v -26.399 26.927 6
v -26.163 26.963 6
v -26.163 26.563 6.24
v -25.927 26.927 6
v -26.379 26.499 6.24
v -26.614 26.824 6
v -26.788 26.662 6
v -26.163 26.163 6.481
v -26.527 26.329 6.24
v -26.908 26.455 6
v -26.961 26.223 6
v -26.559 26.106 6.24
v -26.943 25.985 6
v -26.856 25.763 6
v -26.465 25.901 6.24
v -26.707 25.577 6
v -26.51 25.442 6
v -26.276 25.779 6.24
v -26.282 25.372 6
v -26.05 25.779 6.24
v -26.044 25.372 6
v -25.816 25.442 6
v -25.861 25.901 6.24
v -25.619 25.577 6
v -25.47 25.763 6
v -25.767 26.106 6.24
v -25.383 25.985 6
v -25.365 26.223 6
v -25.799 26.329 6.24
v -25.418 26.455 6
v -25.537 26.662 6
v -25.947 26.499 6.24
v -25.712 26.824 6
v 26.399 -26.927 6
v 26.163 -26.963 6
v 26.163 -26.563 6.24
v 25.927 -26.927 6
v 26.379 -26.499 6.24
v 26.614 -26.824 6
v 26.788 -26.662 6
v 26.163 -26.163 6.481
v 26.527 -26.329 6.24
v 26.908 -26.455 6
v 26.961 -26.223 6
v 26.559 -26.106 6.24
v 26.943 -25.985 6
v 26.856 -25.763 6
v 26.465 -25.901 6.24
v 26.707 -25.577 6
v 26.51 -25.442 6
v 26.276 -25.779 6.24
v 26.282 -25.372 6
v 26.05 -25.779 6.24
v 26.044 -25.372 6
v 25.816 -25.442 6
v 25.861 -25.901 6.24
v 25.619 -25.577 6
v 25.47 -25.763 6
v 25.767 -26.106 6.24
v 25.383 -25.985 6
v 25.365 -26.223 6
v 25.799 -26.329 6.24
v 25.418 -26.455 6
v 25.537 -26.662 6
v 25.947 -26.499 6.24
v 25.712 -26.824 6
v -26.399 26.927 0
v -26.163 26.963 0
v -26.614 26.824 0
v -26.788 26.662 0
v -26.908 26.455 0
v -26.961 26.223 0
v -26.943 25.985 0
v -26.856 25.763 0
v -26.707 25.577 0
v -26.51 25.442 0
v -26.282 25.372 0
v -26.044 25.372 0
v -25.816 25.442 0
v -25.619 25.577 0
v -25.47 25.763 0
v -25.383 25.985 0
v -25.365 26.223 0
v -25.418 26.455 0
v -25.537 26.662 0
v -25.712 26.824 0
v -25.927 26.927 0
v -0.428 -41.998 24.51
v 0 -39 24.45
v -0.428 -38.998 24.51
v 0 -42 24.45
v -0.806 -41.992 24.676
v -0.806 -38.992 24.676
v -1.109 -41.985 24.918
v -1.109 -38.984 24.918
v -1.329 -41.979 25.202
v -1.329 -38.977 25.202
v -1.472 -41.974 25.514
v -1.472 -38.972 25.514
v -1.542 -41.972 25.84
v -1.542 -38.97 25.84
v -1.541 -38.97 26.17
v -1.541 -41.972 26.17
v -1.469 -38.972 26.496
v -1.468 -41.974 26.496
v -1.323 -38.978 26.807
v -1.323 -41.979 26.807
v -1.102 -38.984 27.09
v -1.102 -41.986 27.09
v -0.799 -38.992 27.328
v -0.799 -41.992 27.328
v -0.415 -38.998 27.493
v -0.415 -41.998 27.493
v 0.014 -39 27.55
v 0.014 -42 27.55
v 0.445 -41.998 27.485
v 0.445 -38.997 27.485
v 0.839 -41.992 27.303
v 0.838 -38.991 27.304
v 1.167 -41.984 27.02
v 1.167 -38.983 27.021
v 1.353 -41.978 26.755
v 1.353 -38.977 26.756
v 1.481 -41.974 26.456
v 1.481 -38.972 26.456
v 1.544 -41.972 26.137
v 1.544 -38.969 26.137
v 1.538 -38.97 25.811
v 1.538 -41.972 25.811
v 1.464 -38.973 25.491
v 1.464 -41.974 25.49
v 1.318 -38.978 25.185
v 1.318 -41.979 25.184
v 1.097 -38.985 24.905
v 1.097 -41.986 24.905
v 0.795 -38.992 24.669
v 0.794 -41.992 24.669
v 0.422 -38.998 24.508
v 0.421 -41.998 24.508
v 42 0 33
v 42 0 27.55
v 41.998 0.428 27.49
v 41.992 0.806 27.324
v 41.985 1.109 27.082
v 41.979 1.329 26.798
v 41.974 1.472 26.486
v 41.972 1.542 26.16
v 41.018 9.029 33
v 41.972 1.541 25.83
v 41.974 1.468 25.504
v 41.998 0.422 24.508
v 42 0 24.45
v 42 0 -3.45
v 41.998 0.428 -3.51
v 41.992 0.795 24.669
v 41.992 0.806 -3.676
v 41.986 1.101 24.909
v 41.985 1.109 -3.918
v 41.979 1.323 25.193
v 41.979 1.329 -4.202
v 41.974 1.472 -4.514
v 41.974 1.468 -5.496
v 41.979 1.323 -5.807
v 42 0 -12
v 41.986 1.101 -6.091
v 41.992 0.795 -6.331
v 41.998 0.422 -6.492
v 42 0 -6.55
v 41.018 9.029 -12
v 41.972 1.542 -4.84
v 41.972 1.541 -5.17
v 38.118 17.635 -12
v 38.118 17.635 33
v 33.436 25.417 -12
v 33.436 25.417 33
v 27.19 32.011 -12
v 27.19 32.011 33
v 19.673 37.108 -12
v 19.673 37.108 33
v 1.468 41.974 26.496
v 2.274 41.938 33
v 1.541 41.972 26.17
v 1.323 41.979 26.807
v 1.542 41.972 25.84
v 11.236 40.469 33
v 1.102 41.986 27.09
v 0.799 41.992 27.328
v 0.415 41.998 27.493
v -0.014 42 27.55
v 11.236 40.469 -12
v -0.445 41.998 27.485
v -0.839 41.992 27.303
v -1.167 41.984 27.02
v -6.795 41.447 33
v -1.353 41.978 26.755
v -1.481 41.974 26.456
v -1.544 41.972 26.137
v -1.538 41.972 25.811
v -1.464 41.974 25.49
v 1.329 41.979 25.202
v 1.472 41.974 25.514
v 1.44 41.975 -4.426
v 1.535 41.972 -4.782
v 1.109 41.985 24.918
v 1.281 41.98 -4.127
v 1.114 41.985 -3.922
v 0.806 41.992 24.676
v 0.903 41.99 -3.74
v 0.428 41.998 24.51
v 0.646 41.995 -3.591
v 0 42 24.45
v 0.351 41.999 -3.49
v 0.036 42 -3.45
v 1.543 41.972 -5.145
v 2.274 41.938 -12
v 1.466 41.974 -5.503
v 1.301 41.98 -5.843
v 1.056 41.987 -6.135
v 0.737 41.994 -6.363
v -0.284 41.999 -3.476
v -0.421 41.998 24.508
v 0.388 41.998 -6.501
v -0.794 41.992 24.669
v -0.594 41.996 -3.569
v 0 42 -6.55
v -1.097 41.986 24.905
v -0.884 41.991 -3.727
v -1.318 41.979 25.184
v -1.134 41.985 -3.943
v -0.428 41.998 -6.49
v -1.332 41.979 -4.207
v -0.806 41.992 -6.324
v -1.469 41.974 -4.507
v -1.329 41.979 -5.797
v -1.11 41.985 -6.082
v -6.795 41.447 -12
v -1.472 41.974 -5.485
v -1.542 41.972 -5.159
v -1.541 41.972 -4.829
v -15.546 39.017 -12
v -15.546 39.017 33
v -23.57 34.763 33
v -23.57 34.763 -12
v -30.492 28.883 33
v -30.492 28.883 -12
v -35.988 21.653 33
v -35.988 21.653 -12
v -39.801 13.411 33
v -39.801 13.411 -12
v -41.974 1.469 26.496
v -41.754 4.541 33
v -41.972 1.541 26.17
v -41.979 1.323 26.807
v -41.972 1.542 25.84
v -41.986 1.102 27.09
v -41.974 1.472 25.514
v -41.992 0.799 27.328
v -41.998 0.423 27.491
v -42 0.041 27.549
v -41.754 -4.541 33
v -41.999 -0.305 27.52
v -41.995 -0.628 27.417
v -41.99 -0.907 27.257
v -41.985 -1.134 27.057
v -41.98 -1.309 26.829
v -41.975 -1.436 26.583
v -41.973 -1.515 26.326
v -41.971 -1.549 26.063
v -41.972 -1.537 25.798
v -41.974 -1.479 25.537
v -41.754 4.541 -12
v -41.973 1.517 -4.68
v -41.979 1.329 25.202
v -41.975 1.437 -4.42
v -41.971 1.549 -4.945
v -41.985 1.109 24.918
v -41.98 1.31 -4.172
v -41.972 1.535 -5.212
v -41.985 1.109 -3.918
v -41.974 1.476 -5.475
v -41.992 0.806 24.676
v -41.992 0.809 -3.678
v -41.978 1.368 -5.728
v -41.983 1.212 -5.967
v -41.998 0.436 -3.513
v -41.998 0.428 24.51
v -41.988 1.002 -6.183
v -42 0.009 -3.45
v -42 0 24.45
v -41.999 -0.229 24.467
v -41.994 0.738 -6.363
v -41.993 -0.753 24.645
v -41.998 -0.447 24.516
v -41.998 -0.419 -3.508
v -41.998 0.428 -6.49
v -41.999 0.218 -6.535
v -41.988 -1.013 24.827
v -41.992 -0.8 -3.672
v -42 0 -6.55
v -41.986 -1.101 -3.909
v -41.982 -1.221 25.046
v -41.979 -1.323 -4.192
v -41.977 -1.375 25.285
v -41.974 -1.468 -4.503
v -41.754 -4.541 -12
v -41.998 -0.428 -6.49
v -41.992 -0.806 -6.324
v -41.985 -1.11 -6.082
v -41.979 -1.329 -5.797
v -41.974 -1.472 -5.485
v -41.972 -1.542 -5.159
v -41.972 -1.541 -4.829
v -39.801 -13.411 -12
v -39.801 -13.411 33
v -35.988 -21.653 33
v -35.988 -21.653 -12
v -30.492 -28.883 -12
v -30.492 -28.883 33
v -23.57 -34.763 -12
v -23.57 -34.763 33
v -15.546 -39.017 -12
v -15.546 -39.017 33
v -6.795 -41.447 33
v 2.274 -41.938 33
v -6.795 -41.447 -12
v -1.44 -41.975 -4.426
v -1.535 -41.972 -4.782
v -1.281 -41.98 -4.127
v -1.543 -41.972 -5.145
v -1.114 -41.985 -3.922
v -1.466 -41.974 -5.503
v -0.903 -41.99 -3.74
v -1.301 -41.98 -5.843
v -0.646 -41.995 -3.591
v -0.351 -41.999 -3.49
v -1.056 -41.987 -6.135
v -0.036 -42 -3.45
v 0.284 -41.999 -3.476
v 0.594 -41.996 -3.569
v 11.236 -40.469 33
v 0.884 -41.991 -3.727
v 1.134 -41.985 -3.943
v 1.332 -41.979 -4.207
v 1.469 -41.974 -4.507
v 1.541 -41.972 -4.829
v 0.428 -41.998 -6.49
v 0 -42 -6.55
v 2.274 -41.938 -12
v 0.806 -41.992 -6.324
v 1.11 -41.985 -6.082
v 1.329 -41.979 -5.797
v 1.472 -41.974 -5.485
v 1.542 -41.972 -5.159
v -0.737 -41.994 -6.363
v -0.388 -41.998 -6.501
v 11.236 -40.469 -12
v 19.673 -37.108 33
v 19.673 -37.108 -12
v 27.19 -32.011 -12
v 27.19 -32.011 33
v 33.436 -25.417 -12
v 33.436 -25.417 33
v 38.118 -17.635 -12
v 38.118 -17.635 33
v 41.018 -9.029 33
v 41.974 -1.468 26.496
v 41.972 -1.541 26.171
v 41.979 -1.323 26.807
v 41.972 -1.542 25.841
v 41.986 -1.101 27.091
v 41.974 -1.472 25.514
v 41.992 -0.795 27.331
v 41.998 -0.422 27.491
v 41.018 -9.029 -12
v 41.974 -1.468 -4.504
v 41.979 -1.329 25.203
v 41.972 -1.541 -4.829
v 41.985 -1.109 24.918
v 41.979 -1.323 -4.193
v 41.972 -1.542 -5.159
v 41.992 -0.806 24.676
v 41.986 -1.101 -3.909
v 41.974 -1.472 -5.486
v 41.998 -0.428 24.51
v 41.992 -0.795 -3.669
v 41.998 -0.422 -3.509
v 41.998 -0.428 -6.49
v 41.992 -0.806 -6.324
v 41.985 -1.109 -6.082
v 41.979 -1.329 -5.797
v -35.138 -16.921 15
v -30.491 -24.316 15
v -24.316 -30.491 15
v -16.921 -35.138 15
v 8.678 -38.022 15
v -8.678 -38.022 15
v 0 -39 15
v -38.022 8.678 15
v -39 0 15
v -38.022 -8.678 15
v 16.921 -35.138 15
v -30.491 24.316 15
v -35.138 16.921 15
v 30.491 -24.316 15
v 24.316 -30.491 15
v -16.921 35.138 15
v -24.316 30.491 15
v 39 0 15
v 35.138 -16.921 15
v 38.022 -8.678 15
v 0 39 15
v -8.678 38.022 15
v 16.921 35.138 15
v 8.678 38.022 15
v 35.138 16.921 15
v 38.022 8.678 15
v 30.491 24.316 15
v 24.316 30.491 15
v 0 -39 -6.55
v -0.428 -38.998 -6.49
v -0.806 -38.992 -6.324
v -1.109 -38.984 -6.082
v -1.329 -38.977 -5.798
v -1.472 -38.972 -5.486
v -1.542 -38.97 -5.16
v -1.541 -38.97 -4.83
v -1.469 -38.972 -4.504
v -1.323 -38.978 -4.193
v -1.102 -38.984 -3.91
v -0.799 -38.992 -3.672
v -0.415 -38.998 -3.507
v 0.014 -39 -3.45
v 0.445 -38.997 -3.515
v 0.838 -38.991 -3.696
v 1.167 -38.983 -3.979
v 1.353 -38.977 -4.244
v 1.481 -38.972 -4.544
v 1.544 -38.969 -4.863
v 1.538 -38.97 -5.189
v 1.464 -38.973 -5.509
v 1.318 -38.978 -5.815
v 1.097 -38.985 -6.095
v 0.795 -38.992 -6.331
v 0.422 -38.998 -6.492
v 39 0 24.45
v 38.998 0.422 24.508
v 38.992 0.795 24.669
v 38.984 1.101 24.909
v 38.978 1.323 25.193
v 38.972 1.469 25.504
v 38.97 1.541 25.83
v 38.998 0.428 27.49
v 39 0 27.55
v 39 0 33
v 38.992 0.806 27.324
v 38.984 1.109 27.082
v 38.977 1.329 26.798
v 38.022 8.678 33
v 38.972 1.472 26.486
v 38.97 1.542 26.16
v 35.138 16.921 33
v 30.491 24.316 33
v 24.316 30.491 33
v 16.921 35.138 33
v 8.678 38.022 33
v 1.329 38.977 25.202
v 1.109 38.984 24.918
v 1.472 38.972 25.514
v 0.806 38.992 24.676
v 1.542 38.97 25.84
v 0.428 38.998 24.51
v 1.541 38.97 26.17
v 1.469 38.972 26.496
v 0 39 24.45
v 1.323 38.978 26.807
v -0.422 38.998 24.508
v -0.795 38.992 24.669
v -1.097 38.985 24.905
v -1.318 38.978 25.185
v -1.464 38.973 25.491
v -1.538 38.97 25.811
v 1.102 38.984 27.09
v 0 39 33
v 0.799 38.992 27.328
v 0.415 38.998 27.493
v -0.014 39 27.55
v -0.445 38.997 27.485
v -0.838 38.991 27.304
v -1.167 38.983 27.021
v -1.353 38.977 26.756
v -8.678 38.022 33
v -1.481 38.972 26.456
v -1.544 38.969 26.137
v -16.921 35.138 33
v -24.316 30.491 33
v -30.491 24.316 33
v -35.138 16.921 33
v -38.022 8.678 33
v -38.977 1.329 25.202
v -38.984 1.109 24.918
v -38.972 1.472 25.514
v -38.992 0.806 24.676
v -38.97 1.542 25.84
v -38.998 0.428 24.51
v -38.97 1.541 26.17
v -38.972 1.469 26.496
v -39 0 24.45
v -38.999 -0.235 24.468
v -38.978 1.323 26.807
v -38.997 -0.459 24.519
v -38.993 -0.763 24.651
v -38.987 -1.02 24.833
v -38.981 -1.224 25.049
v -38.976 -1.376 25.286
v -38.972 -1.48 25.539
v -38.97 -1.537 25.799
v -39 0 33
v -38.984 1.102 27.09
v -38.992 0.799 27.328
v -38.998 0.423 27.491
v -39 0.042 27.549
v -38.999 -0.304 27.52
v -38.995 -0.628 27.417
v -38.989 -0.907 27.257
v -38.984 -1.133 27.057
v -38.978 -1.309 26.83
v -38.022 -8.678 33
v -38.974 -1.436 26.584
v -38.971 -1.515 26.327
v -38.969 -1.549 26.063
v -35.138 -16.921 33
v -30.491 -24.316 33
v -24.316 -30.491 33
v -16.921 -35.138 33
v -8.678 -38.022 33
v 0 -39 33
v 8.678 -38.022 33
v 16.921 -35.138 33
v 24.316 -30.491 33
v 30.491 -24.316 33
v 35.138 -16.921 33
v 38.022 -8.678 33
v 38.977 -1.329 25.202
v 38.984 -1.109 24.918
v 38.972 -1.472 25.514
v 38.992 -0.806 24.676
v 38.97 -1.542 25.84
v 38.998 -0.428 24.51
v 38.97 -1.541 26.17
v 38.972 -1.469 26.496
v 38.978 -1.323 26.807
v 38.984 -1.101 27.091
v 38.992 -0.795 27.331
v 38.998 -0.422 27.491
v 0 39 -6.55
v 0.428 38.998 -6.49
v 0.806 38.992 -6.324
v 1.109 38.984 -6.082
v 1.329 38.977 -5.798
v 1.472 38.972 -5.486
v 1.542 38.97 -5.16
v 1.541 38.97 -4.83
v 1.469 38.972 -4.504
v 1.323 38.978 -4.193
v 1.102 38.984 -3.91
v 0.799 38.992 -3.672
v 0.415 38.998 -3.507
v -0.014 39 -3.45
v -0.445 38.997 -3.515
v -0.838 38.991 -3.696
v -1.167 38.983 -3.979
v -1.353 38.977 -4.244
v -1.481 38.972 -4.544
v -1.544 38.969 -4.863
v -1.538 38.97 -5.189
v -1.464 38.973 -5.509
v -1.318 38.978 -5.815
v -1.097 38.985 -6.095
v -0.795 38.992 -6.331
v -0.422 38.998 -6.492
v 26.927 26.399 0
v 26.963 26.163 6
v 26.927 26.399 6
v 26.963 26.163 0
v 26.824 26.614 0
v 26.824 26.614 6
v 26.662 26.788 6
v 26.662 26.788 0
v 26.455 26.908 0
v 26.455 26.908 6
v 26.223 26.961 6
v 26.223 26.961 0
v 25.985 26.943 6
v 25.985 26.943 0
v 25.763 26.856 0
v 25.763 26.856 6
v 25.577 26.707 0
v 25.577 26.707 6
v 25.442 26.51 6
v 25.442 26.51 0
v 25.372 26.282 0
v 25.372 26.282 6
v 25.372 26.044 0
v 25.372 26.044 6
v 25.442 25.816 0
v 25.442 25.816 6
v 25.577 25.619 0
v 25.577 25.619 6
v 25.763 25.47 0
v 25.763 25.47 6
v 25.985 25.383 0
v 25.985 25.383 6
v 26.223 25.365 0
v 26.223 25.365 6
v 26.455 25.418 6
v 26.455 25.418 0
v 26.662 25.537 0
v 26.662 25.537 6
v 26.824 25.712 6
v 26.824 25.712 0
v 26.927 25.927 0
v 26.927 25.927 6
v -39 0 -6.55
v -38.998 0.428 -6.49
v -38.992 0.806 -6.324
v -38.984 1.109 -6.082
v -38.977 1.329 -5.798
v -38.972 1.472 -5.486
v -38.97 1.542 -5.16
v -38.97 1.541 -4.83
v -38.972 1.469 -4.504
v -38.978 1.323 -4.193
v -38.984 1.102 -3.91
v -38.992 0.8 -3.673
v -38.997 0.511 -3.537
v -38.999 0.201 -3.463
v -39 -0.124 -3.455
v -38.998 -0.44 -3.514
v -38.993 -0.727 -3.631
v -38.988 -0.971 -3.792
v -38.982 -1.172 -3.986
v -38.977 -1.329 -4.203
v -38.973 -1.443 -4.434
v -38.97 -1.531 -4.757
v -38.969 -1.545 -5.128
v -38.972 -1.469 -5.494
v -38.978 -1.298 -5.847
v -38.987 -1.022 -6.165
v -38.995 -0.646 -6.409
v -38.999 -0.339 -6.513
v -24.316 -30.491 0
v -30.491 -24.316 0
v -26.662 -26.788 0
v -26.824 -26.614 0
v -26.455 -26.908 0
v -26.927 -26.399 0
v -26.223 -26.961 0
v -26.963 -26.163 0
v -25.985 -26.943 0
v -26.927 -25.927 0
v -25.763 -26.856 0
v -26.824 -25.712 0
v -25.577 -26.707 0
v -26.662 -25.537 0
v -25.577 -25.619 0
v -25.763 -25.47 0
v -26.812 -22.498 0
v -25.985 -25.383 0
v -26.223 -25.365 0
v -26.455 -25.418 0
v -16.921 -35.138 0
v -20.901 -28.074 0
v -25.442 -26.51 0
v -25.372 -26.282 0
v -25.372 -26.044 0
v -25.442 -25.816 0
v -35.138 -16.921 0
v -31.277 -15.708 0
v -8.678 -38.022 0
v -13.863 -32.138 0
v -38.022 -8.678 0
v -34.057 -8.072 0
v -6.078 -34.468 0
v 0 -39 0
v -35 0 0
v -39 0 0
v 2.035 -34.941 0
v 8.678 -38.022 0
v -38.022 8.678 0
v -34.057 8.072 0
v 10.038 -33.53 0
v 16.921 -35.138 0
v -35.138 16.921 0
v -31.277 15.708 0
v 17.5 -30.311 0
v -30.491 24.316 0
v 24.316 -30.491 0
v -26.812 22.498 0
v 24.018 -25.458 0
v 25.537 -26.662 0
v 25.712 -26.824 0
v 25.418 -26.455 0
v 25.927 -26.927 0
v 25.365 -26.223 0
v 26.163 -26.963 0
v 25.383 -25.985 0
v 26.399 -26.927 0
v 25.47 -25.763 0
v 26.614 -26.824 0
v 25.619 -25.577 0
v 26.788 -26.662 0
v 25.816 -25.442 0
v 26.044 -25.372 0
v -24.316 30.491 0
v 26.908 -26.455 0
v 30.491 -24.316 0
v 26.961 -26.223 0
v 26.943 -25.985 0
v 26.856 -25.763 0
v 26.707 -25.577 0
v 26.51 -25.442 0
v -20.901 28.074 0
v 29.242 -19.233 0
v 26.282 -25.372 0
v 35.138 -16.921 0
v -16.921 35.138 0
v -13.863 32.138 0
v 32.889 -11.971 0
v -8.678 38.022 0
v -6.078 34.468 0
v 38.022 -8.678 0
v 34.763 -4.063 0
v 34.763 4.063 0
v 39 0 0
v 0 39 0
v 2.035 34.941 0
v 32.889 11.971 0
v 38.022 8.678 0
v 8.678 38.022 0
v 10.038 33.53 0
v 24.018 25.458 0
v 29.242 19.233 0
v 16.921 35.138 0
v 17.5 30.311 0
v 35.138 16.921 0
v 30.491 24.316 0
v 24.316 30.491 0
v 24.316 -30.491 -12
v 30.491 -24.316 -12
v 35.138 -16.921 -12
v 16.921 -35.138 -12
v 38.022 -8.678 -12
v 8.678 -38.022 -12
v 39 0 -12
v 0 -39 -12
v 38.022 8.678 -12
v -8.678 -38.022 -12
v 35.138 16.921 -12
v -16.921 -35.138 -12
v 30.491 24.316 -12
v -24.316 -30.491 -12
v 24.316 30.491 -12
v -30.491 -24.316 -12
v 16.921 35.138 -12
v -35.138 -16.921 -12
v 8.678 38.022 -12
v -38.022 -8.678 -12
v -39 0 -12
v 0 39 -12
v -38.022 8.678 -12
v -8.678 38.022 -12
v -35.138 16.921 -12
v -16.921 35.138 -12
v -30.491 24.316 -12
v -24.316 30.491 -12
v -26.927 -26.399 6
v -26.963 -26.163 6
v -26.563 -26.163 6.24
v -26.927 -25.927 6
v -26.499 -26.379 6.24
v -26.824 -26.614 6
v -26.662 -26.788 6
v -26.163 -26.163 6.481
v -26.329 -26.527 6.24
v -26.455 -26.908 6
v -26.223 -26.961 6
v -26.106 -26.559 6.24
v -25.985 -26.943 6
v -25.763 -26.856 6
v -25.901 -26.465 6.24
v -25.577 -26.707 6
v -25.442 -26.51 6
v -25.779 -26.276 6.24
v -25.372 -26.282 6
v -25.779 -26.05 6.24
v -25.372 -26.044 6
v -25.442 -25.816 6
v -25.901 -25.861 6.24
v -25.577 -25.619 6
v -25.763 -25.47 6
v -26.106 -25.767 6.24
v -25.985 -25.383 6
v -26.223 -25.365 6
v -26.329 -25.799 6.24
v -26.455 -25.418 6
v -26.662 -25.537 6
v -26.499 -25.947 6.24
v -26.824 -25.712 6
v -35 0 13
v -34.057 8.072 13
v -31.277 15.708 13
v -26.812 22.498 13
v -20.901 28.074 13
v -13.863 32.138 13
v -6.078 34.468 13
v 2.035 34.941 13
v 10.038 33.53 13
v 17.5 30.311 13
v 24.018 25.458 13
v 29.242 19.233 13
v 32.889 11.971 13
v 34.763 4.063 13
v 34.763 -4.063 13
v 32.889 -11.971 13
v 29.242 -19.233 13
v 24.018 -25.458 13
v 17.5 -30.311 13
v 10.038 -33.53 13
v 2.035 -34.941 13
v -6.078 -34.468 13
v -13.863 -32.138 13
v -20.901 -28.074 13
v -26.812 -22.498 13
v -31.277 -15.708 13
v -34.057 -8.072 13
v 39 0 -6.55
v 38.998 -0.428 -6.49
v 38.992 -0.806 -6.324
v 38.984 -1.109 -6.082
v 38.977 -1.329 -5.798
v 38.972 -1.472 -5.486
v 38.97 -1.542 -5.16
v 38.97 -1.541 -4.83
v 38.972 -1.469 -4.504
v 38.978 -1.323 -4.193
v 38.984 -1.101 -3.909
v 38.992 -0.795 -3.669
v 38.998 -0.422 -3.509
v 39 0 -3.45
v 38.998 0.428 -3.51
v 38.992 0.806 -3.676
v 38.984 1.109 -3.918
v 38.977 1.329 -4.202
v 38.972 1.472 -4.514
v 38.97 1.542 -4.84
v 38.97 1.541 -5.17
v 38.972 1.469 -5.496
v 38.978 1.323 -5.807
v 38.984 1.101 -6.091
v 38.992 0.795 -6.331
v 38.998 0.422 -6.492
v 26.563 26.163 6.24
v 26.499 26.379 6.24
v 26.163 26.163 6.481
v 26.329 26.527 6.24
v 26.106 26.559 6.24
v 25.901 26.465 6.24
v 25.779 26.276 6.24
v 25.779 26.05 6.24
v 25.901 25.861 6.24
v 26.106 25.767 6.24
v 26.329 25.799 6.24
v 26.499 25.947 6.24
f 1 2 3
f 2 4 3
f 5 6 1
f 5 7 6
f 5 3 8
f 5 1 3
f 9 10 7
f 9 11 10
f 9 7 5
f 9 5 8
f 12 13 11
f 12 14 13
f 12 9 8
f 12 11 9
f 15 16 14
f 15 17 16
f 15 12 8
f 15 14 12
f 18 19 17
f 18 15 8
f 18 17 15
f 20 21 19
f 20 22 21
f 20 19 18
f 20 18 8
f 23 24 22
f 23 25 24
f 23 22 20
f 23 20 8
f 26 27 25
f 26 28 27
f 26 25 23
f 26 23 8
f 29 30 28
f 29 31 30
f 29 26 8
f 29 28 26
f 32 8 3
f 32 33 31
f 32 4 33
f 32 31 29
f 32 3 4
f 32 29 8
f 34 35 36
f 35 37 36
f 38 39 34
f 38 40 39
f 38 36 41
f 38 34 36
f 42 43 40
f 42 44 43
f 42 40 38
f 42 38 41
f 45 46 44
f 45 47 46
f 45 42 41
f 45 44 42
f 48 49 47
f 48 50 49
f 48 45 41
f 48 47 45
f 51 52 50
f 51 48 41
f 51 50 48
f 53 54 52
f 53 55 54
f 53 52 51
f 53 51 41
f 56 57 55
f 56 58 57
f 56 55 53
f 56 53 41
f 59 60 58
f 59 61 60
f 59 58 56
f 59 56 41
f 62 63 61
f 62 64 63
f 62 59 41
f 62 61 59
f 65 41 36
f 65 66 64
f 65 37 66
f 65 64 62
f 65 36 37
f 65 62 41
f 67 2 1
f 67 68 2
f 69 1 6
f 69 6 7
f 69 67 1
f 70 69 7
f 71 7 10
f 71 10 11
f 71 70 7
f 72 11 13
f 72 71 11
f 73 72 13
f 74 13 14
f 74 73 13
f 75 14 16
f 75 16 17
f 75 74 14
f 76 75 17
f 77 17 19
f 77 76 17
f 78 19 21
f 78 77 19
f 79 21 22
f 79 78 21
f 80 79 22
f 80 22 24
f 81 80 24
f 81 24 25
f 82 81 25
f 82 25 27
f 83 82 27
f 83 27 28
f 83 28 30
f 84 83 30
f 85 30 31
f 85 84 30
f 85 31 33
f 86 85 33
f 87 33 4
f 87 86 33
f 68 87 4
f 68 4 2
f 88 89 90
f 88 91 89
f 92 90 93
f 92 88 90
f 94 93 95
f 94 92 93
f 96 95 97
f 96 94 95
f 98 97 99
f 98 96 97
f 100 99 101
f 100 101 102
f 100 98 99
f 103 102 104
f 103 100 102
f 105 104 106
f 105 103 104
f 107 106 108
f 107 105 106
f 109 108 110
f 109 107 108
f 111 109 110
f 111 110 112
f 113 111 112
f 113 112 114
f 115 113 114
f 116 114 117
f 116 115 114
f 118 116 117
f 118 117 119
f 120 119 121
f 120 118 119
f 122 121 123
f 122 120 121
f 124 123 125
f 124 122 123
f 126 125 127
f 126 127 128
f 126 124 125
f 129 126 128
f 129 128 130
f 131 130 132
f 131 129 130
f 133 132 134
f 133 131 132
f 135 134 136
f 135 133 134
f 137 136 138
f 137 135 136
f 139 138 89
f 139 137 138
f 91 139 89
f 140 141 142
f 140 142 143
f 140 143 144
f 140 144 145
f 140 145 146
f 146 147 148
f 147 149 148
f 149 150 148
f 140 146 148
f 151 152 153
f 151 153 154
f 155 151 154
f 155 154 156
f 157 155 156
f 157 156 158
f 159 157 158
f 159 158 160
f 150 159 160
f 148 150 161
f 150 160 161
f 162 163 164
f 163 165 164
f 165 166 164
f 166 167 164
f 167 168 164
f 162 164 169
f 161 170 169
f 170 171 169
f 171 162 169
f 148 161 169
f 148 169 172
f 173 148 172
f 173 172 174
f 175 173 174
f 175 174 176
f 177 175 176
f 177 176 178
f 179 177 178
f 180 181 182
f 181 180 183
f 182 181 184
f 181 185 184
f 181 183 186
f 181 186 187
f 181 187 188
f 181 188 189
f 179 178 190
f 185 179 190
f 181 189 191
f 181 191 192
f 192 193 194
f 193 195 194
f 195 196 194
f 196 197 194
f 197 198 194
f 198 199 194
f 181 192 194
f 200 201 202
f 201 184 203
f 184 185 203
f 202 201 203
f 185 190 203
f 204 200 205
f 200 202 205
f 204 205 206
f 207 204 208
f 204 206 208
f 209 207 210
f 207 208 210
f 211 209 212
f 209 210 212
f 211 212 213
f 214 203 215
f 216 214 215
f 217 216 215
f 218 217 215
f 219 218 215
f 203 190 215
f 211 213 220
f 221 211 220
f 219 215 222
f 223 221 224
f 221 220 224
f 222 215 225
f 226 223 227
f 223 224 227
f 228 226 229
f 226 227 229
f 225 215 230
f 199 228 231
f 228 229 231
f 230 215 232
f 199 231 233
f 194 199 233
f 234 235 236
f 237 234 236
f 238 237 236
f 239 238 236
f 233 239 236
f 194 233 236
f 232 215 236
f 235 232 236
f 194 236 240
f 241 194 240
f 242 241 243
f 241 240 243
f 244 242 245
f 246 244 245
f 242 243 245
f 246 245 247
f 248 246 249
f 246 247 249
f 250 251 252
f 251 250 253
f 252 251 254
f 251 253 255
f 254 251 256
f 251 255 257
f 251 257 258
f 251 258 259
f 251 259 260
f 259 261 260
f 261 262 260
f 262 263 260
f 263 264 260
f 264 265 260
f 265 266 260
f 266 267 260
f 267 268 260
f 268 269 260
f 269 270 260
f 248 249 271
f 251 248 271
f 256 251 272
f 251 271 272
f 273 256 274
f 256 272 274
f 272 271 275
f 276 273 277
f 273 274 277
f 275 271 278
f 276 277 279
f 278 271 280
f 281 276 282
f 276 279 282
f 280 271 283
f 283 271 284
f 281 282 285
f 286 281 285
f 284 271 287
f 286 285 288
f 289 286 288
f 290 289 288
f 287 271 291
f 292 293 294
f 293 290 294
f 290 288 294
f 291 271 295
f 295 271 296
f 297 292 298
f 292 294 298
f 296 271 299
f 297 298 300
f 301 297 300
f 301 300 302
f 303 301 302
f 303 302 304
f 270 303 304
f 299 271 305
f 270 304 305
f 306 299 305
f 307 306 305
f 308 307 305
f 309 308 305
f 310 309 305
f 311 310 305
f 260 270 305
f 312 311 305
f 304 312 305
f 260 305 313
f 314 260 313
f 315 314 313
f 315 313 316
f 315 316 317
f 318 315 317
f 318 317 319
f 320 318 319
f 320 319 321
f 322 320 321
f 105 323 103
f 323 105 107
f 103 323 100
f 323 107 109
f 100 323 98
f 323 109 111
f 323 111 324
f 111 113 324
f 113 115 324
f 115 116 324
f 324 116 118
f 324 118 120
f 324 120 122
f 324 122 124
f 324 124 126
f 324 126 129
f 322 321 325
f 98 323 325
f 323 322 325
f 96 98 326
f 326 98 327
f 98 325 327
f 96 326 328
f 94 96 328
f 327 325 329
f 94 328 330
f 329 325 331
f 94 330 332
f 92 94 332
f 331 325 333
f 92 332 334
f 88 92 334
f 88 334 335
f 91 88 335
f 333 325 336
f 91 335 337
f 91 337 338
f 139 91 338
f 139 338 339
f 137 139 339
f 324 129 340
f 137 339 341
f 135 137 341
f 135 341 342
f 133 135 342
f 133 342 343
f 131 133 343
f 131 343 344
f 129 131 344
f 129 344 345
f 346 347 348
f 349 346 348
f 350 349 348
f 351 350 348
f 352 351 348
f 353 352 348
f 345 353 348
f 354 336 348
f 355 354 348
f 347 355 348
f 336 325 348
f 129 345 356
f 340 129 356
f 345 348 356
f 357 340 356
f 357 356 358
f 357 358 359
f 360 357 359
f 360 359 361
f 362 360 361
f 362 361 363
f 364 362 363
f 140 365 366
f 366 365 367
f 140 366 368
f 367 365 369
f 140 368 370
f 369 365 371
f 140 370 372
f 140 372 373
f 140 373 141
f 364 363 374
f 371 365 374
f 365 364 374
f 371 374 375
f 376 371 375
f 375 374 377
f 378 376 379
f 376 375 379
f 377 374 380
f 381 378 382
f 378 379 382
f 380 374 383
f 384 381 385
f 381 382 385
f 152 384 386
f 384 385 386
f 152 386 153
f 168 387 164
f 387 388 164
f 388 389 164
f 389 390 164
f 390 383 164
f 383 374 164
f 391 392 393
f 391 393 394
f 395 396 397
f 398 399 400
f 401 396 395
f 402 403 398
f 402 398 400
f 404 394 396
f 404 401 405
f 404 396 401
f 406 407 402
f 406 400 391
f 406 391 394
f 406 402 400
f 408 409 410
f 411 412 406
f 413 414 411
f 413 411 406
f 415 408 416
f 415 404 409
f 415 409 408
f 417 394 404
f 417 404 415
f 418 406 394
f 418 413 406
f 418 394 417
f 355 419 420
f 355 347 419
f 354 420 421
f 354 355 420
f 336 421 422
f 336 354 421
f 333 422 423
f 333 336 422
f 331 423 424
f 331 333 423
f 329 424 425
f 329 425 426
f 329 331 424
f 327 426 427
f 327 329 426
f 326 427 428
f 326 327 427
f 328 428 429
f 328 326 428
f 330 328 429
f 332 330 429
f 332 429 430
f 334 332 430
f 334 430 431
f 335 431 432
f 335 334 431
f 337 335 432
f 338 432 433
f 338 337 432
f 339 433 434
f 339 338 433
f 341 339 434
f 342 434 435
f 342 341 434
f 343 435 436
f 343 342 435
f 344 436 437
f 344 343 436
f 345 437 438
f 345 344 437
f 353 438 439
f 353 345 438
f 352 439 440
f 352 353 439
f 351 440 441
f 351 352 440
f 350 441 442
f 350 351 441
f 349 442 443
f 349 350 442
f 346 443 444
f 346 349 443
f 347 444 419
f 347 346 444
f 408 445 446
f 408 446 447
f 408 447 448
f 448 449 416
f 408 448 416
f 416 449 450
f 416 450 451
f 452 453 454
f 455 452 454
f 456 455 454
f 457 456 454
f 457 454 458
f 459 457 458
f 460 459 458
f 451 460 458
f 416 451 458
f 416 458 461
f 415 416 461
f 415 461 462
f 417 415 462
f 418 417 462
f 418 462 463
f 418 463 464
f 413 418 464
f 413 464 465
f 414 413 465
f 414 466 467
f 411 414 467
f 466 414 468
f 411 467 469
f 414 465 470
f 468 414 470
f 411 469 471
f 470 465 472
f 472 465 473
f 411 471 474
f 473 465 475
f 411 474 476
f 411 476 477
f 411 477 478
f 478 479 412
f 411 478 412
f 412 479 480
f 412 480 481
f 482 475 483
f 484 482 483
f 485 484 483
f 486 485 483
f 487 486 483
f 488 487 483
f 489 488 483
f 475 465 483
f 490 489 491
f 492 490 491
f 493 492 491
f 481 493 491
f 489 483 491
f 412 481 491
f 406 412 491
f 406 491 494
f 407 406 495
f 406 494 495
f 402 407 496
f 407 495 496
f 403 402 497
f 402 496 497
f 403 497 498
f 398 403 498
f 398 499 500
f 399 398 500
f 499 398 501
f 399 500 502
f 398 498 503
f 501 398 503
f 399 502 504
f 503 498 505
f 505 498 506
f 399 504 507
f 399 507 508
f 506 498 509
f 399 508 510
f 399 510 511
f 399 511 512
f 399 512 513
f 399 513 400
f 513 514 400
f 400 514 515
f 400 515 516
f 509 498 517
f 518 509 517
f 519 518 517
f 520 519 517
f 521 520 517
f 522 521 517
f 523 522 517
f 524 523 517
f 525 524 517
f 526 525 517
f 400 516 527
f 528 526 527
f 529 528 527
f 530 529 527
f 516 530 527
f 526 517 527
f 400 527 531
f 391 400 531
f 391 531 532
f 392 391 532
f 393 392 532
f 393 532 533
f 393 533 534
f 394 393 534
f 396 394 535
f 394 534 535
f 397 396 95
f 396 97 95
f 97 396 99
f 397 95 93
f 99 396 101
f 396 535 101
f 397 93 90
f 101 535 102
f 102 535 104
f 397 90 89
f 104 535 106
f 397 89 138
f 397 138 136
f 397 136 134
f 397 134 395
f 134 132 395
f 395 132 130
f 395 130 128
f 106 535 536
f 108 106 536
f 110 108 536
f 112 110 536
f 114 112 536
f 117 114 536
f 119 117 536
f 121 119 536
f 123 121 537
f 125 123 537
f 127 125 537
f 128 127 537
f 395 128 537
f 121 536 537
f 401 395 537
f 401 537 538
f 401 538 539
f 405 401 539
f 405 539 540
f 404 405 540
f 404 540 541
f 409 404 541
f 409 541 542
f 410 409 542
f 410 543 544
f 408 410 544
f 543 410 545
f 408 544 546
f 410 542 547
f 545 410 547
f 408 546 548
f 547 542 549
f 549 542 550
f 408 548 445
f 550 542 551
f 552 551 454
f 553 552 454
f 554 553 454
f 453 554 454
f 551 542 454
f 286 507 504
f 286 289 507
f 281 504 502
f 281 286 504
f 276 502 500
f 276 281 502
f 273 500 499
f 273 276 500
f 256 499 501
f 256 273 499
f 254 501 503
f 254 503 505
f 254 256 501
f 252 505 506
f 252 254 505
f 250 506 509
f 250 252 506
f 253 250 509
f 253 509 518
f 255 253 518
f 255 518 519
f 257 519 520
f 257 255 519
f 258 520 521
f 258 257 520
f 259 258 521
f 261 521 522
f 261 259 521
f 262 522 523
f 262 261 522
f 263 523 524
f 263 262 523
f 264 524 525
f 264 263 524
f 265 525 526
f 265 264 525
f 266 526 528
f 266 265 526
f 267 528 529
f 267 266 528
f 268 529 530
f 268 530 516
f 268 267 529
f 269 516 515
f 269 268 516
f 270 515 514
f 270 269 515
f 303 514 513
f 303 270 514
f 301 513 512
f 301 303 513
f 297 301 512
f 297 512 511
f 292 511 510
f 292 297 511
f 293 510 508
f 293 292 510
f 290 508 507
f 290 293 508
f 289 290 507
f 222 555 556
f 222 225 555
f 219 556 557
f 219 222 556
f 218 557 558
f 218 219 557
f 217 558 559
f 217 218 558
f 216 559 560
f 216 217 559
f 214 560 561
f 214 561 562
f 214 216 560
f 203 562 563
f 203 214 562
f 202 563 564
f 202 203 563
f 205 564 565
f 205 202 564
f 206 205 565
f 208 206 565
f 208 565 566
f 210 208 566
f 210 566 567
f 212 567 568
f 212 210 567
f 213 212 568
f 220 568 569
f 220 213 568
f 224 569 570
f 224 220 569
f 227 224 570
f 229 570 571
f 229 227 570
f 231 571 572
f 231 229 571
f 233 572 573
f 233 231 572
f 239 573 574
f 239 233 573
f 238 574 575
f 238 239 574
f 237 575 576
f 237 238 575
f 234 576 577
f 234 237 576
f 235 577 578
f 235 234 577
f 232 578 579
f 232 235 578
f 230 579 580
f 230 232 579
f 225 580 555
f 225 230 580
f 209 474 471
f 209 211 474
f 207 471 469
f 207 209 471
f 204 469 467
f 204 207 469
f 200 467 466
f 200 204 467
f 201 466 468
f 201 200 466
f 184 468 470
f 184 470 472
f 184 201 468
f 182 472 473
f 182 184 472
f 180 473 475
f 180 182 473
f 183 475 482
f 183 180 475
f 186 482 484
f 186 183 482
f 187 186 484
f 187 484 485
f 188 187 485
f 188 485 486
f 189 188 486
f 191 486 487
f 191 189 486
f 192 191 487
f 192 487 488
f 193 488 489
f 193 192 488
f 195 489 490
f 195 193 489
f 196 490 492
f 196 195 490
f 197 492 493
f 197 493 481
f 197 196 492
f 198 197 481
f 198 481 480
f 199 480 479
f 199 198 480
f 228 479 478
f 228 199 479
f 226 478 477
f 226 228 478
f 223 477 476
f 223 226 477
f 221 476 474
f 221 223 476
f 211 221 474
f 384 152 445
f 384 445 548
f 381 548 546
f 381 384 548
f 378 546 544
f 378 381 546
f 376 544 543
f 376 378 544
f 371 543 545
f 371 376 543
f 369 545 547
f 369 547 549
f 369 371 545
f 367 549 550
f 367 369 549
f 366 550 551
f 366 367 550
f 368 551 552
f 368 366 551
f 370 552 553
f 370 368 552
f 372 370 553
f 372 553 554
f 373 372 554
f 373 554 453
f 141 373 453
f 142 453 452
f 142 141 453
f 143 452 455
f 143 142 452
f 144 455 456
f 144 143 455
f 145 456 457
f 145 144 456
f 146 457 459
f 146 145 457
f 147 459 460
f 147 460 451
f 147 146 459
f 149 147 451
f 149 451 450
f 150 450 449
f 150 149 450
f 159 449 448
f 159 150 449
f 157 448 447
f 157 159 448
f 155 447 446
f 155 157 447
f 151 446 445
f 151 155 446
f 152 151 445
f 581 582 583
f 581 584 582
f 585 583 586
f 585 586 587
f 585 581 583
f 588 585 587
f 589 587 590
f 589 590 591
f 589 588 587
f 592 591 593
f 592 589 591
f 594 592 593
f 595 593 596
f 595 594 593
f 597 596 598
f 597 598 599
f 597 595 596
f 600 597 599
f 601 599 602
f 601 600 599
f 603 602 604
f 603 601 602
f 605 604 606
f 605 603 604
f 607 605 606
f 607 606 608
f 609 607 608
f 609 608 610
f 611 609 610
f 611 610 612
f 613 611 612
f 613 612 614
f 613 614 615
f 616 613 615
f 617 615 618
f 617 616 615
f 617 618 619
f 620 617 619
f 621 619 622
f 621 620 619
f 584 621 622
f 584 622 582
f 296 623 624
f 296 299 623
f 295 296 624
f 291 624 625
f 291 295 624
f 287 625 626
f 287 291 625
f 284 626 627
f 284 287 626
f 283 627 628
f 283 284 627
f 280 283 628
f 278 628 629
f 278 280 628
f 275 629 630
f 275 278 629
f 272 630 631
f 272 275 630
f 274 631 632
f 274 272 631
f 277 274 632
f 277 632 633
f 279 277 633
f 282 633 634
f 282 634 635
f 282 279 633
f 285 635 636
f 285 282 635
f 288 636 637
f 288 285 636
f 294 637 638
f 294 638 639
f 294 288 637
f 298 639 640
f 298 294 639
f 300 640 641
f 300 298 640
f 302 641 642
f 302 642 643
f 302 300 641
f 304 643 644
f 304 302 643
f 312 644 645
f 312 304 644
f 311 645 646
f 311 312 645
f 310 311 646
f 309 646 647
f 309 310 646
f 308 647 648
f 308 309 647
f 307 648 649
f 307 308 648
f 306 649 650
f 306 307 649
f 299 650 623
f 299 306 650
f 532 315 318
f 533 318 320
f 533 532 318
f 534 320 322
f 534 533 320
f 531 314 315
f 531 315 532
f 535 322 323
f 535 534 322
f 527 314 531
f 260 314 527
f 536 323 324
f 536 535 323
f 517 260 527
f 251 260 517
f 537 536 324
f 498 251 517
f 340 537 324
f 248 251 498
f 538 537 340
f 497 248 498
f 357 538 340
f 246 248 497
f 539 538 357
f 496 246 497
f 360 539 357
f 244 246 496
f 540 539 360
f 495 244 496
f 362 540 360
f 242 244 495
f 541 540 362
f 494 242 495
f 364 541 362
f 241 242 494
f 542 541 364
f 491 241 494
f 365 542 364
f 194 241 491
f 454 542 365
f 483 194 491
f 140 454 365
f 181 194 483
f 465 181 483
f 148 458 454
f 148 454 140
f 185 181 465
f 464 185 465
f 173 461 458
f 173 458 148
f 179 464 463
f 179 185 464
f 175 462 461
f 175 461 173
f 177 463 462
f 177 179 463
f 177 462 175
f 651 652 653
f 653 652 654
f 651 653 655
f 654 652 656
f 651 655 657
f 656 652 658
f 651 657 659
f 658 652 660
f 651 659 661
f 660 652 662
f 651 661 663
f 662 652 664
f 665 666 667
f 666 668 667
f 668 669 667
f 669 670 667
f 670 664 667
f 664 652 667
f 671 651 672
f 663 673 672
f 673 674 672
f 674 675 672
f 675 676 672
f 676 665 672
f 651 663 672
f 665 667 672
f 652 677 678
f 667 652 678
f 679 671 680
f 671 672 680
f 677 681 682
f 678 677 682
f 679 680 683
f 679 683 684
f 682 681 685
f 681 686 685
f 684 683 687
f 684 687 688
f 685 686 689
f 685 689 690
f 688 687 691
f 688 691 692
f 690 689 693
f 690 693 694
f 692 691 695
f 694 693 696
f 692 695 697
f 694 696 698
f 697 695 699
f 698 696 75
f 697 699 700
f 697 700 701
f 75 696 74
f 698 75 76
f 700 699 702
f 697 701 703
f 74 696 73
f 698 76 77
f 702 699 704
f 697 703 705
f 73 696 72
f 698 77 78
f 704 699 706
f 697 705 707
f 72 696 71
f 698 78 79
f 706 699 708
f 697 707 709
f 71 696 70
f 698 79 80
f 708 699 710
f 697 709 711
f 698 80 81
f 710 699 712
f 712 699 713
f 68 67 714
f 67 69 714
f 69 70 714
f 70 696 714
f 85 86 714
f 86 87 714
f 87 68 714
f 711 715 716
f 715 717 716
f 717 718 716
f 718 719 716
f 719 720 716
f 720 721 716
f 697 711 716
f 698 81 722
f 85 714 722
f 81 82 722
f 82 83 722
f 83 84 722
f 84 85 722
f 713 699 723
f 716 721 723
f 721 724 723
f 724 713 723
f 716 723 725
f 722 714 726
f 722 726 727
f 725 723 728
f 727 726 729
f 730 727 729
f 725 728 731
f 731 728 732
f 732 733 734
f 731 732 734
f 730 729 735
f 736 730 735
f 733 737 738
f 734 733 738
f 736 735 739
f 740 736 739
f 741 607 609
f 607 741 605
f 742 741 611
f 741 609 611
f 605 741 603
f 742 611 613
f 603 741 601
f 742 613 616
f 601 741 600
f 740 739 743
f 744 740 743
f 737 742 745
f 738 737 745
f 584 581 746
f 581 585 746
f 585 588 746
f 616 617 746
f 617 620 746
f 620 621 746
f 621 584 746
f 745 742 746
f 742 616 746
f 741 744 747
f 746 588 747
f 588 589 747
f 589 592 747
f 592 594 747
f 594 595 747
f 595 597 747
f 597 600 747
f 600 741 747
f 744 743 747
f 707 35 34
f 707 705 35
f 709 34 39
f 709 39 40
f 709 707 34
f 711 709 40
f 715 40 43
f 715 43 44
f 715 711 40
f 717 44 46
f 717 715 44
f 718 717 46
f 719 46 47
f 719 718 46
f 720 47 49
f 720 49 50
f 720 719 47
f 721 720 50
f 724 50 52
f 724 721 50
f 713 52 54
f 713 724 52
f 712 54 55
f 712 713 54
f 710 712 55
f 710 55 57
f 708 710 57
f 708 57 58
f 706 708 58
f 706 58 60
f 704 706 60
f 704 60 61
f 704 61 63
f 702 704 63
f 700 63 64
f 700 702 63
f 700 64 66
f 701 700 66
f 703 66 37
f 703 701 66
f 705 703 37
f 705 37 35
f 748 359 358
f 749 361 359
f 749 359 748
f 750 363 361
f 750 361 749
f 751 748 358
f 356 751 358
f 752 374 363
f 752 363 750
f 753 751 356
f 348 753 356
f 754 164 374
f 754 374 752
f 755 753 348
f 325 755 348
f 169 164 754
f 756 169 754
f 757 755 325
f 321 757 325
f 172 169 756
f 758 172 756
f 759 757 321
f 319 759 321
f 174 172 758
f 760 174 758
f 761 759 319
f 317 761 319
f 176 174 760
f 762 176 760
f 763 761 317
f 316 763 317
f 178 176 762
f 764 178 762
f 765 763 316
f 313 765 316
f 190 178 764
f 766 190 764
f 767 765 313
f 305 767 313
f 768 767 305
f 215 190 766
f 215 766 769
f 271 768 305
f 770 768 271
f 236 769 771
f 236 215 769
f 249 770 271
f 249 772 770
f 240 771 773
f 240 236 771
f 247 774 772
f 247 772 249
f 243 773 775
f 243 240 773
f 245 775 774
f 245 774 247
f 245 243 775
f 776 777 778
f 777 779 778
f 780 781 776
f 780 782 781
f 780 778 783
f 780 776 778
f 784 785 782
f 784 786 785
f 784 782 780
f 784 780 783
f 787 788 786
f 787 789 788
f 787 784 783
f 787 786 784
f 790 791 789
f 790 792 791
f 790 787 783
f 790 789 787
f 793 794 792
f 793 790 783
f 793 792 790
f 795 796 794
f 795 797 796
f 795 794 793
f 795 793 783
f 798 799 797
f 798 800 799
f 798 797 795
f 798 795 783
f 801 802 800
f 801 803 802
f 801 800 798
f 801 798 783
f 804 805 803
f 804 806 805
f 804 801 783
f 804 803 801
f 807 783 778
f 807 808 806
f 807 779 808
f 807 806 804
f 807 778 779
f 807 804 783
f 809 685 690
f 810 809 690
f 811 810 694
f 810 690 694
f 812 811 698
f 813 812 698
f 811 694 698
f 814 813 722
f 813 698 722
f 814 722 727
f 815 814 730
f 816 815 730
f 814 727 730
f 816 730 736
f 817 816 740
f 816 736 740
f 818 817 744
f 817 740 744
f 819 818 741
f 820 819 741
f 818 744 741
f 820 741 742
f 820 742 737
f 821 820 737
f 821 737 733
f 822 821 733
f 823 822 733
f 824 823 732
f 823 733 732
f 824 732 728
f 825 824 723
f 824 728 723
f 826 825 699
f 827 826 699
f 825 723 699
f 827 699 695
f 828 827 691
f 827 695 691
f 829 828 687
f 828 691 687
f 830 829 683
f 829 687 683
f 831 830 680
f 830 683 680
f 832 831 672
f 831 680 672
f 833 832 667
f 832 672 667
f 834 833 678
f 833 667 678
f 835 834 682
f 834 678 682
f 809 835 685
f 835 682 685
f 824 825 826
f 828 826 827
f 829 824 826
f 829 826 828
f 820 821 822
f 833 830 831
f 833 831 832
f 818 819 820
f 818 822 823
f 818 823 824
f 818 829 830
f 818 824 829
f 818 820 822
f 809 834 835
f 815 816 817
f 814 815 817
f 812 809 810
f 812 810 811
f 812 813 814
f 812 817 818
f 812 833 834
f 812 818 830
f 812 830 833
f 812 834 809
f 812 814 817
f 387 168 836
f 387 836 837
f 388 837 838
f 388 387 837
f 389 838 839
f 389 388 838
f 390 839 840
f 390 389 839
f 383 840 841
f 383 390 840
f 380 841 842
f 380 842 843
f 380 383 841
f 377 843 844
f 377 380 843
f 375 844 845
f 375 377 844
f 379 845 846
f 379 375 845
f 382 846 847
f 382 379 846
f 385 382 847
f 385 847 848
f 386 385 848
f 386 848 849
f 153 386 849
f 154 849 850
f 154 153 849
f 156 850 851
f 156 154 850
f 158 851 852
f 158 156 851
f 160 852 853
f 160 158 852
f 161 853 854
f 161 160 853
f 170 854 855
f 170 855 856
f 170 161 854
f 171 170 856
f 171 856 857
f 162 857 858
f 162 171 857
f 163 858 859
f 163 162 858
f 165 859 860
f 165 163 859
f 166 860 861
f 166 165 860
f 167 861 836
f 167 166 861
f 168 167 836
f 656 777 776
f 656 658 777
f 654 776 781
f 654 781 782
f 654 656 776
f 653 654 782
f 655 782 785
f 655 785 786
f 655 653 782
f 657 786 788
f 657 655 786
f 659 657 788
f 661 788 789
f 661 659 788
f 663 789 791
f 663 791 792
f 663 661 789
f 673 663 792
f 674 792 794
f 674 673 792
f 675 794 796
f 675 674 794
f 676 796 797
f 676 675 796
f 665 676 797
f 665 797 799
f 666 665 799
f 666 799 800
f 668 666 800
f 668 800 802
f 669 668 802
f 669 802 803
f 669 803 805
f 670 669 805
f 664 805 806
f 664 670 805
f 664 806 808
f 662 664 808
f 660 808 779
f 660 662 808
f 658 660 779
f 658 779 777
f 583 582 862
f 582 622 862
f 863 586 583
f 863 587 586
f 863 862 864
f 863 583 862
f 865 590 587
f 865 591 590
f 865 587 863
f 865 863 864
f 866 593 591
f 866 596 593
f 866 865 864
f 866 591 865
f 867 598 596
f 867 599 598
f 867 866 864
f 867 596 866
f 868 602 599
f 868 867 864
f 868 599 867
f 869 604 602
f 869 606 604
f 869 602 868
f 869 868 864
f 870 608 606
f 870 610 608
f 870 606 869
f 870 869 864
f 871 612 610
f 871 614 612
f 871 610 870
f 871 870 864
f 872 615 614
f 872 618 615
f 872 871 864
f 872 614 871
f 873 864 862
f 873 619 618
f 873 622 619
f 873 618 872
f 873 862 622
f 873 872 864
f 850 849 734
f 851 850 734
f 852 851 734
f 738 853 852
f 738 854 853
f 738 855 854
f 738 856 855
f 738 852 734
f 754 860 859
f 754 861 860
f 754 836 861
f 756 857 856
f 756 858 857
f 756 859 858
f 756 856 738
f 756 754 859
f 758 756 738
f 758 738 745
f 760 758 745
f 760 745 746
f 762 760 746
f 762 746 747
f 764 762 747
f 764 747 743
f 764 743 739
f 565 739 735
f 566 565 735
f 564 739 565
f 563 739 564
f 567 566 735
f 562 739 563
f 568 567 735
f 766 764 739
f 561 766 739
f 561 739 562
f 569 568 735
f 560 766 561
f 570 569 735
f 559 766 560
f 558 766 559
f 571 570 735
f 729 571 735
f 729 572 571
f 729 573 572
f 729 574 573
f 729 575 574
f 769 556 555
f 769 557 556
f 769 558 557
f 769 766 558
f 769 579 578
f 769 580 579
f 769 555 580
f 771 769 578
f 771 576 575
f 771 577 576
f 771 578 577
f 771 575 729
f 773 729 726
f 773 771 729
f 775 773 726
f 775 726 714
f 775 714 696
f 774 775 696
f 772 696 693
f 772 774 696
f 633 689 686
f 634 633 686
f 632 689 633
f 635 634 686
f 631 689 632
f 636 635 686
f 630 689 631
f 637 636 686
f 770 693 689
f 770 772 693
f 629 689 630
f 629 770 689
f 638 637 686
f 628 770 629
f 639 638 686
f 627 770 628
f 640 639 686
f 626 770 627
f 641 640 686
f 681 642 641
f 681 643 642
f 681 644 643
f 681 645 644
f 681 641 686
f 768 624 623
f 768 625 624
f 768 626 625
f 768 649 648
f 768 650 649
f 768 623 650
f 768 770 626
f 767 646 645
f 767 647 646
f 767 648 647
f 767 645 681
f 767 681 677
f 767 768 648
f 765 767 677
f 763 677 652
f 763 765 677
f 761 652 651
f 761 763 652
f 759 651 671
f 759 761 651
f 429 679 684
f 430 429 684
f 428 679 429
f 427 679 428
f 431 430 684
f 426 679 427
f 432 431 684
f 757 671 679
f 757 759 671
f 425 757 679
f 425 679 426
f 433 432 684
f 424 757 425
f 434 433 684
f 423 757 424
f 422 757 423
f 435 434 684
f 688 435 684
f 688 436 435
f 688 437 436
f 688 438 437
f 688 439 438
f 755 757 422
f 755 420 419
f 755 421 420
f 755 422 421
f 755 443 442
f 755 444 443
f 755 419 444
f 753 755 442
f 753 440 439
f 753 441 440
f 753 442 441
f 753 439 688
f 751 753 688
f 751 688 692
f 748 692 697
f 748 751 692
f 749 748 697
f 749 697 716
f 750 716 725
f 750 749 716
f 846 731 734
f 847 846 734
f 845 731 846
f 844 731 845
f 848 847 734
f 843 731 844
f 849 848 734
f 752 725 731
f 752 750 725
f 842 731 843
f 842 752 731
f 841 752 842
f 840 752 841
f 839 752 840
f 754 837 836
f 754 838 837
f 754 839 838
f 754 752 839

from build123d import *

# Parameters (mm, degrees)
ESQUISSE1_R                  = 42
BOSS_EXTRU_1_DEPTH           = 33
R_P_TITION_CIRCULAIRE1_COUNT = 4
ESQUISSE5_R                  = 35
ENL_V_MAT_EXTRU_1_DEPTH      = 13
ESQUISSE7_R                  = 39
ENL_V_MAT_EXTRU_2_DEPTH      = 18
R_P_TITION_CIRCULAIRE2_COUNT = 4
ESQUISSE14_W                 = 3
ESQUISSE14_H                 = 12
R_P_TITION_CIRCULAIRE3_COUNT = 4


with BuildPart() as part:
    # Esquisse1 → Boss.-Extru.1 (new body)
    with BuildSketch(Plane.XY):
        Circle(ESQUISSE1_R)
    extrude(amount=BOSS_EXTRU_1_DEPTH)

    # Esquisse3 → Trou taraudé M21 (revolve, cut)
    with BuildSketch(Plane(origin=(-26.162950904, 26.162950904, 0), x_dir=(0, 1, 0), z_dir=(1, 0, 0))):
        Polygon((0, 0), (0, 6.480688495), (0.8, 6), (0.8, 0), align=None)
    trou_taraud_m21 = revolve(axis=Axis((-26.162950904, 26.162950904, -6.35), (0, 0, 1)), mode=Mode.SUBTRACT)

    # Répétition circulaire1: Trou taraudé M21 ×4 about axis
    r_p_tition_circulaire1_axis = Axis((0, 0, 0), (0, 0, 1))
    for i in range(1, R_P_TITION_CIRCULAIRE1_COUNT):
        add(trou_taraud_m21.rotate(r_p_tition_circulaire1_axis, i * 360 / R_P_TITION_CIRCULAIRE1_COUNT), mode=Mode.SUBTRACT)

    # Esquisse5 → Enlèv. mat.-Extru.1 (cut)
    with BuildSketch(Plane(origin=(0, 0, 0), x_dir=(-1, 0, 0), z_dir=(0, 0, -1))):
        Circle(ESQUISSE5_R)
    extrude(amount=-ENL_V_MAT_EXTRU_1_DEPTH, mode=Mode.SUBTRACT)

    # Esquisse7 → Enlèv. mat.-Extru.2 (cut)
    with BuildSketch(Plane.XY.offset(33)):
        Circle(ESQUISSE7_R)
    extrude(amount=-ENL_V_MAT_EXTRU_2_DEPTH, mode=Mode.SUBTRACT)

    # Esquisse13 → Dégagement M2.51 (revolve, cut)
    with BuildSketch(Plane(origin=(42, 0, 26), x_dir=(0, 0, -1), z_dir=(0, 1, 0))):
        Polygon((0, 0), (0, 10.931333959), (1.55, 10), (1.55, 0), align=None)
    d_gagement_m2_51 = revolve(axis=Axis((48.35, 0, 26), (-1, 0, 0)), mode=Mode.SUBTRACT)

    # Répétition circulaire2: Dégagement M2.51 ×4 about axis
    r_p_tition_circulaire2_axis = Axis((0, 0, 33), (0, 0, 1))
    for i in range(1, R_P_TITION_CIRCULAIRE2_COUNT):
        add(d_gagement_m2_51.rotate(r_p_tition_circulaire2_axis, i * 360 / R_P_TITION_CIRCULAIRE2_COUNT), mode=Mode.SUBTRACT)

    # Esquisse14 → Révolution1 (revolve)
    with BuildSketch(Plane(origin=(0, 0, 0), x_dir=(1, 0, 0), z_dir=(0, 1, 0))):
        with Locations((40.5, 6)):
            Rectangle(ESQUISSE14_W, ESQUISSE14_H)
    revolve(axis=Axis((0, 0, -20.123212499), (0, 0, 1)))

    # Esquisse15 → Dégagement M2.52 (revolve, cut)
    with BuildSketch(Plane(origin=(42, 0, -5), x_dir=(0, 0, -1), z_dir=(0, 1, 0))):
        Polygon((0, 0), (0, 9.431333959), (1.55, 8.5), (1.55, 0), align=None)
    d_gagement_m2_52 = revolve(axis=Axis((48.35, 0, -5), (-1, 0, 0)), mode=Mode.SUBTRACT)

    # Répétition circulaire3: Dégagement M2.52 ×4 about axis
    r_p_tition_circulaire3_axis = Axis((0, 0, 0), (0, 0, -1))
    for i in range(1, R_P_TITION_CIRCULAIRE3_COUNT):
        add(d_gagement_m2_52.rotate(r_p_tition_circulaire3_axis, i * 360 / R_P_TITION_CIRCULAIRE3_COUNT), mode=Mode.SUBTRACT)


solid = part.part
